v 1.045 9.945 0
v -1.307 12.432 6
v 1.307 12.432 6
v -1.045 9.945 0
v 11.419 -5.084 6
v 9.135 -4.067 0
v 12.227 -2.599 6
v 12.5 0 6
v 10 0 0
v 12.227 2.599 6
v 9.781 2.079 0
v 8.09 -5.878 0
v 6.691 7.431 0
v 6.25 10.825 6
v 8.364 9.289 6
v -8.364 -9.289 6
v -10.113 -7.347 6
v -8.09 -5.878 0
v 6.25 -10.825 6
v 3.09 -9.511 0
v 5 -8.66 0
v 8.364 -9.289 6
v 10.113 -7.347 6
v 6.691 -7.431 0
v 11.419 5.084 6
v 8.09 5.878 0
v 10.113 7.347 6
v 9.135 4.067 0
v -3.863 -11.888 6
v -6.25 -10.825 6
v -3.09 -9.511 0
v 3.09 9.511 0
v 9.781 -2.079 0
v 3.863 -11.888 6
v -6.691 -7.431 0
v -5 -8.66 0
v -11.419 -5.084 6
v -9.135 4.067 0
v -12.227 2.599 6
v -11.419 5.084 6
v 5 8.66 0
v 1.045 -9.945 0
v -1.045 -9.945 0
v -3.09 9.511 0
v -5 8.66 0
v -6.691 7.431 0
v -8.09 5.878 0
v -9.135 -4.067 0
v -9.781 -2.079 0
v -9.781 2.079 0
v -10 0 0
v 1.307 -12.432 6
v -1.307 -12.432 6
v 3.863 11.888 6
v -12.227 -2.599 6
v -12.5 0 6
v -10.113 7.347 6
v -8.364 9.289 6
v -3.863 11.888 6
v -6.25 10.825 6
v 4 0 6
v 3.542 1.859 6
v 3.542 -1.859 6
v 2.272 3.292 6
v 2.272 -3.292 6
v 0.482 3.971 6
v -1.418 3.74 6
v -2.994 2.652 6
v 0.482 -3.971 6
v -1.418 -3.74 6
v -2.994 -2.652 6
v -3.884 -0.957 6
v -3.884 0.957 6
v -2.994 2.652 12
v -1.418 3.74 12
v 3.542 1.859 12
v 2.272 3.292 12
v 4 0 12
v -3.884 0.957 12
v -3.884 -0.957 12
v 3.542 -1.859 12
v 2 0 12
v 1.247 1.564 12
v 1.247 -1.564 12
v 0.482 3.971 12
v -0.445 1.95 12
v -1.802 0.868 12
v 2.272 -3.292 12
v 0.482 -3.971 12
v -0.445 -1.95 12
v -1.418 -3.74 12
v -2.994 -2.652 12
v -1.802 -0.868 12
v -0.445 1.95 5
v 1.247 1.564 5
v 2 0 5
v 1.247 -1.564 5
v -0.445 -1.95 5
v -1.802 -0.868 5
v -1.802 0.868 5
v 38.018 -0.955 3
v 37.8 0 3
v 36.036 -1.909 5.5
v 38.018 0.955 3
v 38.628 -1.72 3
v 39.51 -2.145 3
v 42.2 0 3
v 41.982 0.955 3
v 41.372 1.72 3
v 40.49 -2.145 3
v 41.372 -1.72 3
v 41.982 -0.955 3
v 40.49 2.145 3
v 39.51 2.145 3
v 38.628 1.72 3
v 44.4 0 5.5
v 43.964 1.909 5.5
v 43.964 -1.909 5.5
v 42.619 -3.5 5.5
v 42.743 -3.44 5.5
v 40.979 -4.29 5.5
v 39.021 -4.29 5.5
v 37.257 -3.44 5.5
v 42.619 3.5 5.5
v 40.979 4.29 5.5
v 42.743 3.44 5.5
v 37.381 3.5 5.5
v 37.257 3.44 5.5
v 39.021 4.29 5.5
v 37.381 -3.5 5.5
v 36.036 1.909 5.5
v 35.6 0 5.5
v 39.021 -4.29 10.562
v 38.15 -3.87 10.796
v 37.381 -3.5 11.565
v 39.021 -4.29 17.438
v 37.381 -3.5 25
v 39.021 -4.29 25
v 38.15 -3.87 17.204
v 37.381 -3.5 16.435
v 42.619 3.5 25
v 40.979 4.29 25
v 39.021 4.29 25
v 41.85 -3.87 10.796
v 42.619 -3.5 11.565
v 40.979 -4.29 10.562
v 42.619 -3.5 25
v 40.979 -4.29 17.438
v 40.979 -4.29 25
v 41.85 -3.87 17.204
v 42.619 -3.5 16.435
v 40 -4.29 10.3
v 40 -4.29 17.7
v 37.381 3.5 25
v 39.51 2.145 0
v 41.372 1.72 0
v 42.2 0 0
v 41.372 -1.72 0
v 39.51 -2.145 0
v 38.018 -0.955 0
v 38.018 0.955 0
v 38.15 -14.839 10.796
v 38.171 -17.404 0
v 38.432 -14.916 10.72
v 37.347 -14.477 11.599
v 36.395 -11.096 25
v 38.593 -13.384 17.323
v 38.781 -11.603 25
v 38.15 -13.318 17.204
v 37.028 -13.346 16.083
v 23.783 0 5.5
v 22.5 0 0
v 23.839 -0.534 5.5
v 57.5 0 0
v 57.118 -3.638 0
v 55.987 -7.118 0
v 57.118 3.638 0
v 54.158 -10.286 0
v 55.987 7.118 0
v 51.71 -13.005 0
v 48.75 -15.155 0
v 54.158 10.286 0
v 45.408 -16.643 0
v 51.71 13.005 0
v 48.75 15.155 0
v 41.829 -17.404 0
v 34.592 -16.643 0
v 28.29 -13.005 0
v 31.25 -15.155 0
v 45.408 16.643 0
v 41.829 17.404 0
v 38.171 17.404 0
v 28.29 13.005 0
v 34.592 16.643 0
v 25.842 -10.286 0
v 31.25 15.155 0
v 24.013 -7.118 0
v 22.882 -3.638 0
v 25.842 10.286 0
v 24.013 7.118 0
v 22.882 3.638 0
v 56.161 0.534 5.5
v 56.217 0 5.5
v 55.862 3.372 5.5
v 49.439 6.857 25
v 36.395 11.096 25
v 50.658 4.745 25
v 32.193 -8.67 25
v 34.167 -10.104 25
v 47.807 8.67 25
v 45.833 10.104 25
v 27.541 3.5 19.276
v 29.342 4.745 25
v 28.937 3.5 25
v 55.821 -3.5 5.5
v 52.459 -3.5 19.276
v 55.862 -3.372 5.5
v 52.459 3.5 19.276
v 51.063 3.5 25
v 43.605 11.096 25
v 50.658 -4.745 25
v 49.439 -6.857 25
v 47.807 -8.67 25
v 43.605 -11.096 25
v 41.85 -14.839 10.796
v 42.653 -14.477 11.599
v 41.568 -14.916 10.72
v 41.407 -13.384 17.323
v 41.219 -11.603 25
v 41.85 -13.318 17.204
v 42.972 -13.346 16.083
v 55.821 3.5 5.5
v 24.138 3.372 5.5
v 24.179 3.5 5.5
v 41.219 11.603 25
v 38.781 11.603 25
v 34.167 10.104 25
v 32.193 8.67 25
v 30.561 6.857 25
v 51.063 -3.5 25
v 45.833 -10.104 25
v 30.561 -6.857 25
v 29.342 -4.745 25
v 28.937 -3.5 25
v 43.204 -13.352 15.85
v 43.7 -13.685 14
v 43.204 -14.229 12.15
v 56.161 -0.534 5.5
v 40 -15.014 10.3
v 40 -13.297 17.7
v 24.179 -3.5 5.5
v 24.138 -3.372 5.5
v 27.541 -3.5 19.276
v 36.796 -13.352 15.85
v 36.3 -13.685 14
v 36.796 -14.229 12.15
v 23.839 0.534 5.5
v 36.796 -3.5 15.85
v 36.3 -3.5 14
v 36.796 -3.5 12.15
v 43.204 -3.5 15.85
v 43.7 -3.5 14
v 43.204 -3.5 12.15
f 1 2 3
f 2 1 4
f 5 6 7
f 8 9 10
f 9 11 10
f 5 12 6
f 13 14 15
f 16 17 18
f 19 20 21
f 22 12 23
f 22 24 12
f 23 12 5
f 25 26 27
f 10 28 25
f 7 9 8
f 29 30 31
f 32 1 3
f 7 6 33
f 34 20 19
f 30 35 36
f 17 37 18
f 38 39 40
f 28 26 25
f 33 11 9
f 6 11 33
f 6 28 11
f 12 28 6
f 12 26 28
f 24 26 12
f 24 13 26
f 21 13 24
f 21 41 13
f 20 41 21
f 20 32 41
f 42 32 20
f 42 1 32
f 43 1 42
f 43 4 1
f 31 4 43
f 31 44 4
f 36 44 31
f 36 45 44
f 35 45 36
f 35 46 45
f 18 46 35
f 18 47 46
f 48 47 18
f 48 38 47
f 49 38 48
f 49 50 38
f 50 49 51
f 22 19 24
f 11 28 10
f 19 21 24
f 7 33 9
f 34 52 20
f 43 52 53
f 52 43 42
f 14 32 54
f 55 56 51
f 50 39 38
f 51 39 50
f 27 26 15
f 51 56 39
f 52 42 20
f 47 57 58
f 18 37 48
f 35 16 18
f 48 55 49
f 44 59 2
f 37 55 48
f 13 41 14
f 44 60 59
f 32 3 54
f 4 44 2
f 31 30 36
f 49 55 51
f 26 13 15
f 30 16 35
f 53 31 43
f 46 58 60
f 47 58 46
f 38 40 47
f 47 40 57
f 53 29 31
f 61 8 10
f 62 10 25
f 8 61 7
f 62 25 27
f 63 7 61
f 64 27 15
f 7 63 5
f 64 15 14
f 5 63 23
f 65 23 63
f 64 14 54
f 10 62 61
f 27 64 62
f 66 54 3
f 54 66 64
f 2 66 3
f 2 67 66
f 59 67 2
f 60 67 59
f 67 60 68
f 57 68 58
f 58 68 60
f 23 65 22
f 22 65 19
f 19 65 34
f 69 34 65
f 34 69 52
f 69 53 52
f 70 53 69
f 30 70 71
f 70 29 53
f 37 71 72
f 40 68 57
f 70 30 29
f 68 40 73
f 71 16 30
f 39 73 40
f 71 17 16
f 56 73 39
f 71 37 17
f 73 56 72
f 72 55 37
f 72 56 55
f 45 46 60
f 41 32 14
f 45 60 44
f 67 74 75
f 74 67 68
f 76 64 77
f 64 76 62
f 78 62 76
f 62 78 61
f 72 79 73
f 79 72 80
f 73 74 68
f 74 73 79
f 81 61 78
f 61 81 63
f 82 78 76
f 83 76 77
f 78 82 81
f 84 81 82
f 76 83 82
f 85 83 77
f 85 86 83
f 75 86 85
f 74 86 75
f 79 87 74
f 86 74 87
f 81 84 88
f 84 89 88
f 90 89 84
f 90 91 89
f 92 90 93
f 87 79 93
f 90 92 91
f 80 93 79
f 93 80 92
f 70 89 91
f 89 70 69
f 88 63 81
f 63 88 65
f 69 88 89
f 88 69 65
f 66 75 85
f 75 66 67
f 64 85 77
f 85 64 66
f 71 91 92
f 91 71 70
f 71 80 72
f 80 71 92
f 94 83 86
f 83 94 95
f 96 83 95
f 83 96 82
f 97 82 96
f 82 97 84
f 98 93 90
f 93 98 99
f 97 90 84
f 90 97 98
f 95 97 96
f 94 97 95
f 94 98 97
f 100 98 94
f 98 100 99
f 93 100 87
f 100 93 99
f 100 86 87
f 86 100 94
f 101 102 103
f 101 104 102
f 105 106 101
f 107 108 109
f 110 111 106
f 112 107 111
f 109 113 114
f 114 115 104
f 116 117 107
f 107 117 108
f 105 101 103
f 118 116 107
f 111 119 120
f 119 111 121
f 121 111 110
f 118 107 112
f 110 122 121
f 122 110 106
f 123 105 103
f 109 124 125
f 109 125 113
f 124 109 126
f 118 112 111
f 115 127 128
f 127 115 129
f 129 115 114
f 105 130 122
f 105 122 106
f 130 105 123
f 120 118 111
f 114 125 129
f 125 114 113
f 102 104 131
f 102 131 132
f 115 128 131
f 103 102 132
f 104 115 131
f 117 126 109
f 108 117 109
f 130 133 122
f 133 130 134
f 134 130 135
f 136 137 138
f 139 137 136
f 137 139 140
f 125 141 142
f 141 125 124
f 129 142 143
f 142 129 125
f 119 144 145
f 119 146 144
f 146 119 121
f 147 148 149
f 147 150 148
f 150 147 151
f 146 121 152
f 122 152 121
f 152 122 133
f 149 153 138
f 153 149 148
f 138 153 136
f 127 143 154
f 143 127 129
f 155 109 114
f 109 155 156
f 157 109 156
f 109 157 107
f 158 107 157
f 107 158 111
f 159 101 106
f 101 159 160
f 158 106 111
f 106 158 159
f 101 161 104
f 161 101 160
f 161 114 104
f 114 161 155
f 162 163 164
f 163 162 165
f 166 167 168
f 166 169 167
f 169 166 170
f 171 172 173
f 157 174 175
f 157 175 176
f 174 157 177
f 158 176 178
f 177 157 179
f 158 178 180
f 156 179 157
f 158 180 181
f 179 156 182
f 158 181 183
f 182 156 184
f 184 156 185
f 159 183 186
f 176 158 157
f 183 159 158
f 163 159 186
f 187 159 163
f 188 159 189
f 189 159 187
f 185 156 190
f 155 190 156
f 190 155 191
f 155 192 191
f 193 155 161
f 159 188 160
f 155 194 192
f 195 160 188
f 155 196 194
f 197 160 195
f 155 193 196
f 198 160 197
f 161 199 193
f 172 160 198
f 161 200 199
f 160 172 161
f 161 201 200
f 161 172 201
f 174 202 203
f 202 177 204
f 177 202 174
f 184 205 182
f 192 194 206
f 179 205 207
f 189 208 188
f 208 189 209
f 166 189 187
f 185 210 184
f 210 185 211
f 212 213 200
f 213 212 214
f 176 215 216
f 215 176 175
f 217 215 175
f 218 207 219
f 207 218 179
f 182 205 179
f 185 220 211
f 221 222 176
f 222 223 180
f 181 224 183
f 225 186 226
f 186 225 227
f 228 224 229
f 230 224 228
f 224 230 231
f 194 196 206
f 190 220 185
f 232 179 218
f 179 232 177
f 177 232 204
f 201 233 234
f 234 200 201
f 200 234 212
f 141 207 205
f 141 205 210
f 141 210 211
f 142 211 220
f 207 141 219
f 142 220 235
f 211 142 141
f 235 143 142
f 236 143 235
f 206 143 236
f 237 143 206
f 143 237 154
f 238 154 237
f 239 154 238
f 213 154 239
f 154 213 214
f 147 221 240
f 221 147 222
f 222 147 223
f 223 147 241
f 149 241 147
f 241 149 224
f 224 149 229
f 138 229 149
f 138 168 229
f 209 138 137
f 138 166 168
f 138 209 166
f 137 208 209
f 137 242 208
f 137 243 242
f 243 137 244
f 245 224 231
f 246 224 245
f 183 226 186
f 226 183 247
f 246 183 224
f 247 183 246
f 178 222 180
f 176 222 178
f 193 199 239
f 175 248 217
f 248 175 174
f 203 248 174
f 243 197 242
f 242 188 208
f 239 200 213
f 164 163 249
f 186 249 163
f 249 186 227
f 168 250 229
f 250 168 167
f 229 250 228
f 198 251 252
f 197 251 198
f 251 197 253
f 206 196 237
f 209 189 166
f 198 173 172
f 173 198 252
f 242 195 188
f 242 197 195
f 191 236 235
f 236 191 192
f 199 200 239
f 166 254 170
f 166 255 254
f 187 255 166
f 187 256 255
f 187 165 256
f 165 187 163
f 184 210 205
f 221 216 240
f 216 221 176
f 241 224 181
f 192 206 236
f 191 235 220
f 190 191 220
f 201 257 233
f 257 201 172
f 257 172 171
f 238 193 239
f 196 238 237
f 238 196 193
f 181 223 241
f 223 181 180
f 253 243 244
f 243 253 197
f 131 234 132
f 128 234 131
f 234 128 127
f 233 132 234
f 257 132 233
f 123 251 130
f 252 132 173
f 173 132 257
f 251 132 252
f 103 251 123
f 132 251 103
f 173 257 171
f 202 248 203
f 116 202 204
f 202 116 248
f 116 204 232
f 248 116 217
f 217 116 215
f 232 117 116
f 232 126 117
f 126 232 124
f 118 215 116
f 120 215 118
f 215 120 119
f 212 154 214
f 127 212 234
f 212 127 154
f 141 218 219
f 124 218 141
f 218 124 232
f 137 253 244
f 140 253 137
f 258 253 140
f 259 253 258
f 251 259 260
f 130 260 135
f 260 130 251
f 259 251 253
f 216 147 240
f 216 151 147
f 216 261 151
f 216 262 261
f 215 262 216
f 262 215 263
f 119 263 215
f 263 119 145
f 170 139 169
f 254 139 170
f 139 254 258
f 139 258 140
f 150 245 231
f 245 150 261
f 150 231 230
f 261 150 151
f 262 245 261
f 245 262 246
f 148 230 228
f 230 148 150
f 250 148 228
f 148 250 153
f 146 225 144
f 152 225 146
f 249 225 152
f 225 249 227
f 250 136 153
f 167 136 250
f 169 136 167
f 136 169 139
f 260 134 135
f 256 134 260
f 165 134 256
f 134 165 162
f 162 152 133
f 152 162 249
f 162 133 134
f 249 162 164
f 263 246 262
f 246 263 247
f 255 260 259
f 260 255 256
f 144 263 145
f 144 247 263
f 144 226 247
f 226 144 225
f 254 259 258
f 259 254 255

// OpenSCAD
//body
dia = 35;
zheight = 25;

//slot
base = 5.5;
width = 7;

//thread hole
supWidth = 11;

//plastic screw hole
zpos = 14;
rad = 3.7;

difference() {
    union() {
        cylinder(6,10,12.5);
        cylinder(12,4,4);
    }
    translate([0,0,5]) cylinder(12,2,2);
}

translate([40,0,0]) shelf_bracket();

module shelf_bracket() {
    difference() {
        translate([0,0,0]) cylinder( zheight,dia/2,dia/3); //body
        translate([-(dia+10)/2, -width /2,base]) cube([dia+10,width, zheight+10]); //slot
        screw_hole();
         translate([0,0,zpos]) rotate([90,0,0]) cylinder(dia/2, rad,rad);
    }
}

module screw_hole() {
    translate([0,0,3]) cylinder(2.5, 2.2,4.4); //screwhole
    translate([0,0,5.5]) cylinder(40, 4.4,4.4); //screwhole
	translate([0,0,-1]) cylinder(3+3, 2.2,2.2); //screwhole
}
